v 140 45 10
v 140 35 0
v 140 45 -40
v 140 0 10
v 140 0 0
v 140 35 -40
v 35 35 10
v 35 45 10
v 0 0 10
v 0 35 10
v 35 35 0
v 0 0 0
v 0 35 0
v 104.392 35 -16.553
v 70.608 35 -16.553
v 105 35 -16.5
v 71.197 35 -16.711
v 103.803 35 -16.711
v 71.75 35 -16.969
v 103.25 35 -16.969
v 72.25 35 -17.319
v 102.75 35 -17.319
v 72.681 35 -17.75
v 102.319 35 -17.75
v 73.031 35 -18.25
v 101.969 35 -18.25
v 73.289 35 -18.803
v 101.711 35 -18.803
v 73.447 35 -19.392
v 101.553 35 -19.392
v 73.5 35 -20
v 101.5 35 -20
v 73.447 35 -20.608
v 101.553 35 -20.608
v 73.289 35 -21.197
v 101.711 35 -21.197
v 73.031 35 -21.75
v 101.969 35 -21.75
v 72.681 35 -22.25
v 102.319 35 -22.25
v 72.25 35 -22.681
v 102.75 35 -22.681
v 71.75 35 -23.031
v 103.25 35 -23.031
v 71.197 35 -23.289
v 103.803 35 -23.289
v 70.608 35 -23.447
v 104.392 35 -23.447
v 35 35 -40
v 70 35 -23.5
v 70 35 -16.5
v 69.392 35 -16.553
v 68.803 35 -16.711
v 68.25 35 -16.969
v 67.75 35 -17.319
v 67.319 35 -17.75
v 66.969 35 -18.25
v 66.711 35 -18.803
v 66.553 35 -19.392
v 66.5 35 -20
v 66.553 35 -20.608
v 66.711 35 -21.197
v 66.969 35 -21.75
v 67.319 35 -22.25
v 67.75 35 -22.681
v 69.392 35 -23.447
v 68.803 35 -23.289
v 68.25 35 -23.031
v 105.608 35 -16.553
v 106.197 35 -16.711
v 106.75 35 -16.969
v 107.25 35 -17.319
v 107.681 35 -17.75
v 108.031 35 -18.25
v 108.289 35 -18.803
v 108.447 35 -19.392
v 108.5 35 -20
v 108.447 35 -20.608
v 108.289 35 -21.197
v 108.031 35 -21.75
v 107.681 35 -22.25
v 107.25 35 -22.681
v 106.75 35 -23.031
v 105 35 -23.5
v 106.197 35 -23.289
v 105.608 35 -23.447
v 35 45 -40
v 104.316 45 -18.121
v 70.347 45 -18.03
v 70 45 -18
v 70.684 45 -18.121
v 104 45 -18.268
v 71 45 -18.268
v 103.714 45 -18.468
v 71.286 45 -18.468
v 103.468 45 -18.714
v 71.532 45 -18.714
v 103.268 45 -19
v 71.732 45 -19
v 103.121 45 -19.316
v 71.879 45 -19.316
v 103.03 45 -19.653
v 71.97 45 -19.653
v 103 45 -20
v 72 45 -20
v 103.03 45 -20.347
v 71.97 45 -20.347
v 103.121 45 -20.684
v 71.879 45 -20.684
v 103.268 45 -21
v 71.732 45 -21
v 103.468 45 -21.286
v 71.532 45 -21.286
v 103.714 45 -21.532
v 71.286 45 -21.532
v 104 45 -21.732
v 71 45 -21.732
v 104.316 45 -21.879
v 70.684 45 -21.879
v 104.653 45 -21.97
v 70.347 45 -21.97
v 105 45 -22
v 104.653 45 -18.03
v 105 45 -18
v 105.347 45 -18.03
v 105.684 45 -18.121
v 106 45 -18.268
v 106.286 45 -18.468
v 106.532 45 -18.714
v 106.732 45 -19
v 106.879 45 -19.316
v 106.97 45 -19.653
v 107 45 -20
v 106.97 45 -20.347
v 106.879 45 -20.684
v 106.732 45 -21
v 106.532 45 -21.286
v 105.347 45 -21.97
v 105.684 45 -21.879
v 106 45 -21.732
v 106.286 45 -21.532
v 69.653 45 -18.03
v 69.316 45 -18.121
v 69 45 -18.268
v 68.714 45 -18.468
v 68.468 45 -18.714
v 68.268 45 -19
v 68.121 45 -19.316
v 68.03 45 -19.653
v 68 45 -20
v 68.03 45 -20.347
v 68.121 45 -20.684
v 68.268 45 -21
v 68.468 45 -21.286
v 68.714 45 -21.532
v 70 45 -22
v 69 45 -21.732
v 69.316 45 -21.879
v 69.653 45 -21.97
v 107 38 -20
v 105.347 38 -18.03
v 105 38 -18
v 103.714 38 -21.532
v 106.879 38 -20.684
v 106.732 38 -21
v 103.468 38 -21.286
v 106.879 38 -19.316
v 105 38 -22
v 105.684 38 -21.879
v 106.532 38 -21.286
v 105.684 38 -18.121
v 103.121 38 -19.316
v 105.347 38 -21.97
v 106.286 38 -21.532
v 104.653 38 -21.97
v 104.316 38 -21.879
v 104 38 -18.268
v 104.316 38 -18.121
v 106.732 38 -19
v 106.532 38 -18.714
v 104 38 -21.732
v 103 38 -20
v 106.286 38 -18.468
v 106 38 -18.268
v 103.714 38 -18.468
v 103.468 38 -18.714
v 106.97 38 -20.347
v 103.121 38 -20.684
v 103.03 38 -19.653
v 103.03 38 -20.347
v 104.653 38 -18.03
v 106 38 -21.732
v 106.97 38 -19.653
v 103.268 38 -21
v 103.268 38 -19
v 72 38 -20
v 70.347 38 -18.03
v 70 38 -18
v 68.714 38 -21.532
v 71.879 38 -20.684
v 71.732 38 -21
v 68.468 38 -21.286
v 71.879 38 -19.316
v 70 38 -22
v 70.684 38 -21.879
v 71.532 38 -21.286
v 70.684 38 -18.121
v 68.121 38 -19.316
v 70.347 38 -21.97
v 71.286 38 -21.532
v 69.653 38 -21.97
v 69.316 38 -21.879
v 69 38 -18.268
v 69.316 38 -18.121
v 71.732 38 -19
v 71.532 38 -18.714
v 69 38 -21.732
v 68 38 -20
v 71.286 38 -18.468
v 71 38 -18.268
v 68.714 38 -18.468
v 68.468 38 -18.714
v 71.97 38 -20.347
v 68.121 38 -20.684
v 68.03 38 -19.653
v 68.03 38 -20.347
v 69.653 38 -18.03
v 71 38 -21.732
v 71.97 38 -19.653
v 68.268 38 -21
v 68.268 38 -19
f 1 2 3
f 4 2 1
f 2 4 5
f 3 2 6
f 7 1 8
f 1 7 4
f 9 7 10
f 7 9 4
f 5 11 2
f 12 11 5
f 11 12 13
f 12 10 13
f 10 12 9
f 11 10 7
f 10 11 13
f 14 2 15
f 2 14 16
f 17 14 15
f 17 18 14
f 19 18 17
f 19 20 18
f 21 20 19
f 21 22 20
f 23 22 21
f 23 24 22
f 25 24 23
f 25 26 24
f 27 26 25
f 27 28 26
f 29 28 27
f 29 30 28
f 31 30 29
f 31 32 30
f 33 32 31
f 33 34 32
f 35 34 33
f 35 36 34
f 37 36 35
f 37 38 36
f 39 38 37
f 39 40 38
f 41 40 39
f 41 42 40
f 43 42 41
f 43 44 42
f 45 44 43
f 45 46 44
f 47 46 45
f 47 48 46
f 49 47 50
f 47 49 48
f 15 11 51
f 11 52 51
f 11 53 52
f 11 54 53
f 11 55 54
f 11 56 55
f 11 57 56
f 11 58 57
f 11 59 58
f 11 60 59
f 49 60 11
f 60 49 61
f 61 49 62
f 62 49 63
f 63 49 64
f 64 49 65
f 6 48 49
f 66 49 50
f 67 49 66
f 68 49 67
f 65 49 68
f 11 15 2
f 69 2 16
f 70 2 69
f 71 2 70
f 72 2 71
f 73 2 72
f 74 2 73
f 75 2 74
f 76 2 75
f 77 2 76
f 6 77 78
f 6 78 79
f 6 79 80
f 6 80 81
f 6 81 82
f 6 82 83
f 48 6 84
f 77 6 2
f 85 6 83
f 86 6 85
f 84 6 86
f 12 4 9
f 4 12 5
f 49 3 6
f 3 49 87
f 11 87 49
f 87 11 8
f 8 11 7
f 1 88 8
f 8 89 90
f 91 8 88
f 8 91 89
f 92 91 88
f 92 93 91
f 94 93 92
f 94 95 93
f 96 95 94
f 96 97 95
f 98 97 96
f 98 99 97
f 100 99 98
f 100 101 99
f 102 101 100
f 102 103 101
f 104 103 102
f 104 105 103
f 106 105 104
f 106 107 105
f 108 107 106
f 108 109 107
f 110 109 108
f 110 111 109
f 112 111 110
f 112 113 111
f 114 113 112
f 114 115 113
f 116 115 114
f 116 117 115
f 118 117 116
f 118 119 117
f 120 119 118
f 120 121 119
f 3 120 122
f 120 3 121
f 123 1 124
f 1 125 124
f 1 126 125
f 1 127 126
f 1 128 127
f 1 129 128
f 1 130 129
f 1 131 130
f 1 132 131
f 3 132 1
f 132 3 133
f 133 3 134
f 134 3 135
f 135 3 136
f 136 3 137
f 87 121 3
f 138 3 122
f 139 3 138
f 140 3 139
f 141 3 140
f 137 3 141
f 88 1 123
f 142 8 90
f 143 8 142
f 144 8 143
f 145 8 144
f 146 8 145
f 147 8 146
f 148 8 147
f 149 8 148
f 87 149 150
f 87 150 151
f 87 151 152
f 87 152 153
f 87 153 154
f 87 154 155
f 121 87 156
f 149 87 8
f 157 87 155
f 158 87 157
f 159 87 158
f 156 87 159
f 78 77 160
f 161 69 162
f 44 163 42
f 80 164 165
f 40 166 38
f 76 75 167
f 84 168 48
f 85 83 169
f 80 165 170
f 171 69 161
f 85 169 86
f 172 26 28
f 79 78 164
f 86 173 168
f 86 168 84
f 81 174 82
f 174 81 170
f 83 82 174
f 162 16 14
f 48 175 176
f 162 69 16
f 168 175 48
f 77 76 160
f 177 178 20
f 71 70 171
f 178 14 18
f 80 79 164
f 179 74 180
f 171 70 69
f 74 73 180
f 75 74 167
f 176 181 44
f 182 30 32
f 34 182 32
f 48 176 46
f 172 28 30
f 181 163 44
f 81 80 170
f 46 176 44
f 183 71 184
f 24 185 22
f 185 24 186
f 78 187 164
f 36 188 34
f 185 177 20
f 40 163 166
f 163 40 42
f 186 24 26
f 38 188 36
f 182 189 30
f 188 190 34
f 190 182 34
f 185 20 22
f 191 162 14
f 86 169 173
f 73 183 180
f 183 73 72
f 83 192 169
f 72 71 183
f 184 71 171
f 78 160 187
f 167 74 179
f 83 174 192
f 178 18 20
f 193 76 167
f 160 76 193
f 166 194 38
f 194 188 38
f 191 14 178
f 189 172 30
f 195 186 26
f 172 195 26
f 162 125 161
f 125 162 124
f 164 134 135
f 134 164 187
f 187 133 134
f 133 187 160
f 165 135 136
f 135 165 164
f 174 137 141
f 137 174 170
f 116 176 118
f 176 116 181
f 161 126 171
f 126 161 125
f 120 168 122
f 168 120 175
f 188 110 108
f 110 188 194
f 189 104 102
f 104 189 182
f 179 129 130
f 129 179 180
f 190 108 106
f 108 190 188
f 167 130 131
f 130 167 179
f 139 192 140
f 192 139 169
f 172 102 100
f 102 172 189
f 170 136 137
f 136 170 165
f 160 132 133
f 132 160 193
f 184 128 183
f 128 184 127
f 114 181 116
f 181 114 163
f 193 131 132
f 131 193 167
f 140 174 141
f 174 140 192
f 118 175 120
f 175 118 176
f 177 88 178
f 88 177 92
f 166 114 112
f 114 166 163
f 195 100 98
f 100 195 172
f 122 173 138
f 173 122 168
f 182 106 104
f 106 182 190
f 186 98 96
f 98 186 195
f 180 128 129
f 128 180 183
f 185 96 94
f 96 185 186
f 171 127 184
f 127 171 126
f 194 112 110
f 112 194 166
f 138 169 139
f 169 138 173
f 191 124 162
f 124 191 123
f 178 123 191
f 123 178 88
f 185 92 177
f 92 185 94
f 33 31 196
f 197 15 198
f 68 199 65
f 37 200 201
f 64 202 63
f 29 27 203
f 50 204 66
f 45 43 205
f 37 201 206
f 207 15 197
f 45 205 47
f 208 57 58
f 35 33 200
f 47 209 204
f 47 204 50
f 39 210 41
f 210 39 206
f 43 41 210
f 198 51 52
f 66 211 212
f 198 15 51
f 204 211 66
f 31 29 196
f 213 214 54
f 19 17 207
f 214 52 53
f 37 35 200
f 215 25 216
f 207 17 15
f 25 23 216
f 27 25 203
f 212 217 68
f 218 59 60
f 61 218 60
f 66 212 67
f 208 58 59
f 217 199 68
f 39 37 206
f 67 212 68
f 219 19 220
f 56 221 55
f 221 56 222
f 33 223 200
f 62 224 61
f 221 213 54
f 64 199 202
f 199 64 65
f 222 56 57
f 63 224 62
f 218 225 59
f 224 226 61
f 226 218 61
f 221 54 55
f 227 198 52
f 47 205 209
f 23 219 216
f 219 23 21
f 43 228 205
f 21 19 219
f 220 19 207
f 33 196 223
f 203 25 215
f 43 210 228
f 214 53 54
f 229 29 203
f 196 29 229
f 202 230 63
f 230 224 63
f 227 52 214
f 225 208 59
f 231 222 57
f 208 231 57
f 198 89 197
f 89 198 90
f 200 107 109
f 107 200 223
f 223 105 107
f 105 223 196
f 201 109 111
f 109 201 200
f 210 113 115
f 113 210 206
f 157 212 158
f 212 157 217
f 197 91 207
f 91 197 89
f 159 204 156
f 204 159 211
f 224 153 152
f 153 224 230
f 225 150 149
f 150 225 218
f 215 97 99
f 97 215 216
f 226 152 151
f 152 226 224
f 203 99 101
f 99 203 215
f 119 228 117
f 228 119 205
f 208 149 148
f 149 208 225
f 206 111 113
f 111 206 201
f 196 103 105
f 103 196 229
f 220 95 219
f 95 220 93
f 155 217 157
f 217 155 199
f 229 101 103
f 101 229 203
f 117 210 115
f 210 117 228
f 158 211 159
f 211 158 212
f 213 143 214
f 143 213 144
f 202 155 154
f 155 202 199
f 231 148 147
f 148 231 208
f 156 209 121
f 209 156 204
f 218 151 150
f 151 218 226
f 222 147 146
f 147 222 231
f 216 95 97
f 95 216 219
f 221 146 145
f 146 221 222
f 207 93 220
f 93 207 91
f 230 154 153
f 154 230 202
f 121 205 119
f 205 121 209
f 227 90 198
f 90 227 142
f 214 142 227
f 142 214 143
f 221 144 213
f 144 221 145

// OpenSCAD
//Breite Holzleiste
a=35;
//Dicke Holzleiste
b=10;
//Breite Brett
c=140;

difference()
{
    
    teil();
    schrauben();



}

module teil()
{

cube([c, a, b]);

translate([a,a,-50+b])
cube([c-a,b,50]);
}
$fn=36;

//Durchmesser Schraube oben
do=7;
//Durchmesser Schraube unten
ds=4;
//Höhe Schraubenkopf
hsk=3;

module schraube()
{
color("#6666FF")
rotate([270,0,0])
{
    cylinder(h=hsk, d1=do, d2=ds);
    translate([0,0,hsk])
    cylinder(h=b,d=ds);
}
}
module schrauben()
{
translate([c-a,a,(-50+b)/2])
schraube();

translate([a+a,a,(-50+b)/2])
schraube();
}
